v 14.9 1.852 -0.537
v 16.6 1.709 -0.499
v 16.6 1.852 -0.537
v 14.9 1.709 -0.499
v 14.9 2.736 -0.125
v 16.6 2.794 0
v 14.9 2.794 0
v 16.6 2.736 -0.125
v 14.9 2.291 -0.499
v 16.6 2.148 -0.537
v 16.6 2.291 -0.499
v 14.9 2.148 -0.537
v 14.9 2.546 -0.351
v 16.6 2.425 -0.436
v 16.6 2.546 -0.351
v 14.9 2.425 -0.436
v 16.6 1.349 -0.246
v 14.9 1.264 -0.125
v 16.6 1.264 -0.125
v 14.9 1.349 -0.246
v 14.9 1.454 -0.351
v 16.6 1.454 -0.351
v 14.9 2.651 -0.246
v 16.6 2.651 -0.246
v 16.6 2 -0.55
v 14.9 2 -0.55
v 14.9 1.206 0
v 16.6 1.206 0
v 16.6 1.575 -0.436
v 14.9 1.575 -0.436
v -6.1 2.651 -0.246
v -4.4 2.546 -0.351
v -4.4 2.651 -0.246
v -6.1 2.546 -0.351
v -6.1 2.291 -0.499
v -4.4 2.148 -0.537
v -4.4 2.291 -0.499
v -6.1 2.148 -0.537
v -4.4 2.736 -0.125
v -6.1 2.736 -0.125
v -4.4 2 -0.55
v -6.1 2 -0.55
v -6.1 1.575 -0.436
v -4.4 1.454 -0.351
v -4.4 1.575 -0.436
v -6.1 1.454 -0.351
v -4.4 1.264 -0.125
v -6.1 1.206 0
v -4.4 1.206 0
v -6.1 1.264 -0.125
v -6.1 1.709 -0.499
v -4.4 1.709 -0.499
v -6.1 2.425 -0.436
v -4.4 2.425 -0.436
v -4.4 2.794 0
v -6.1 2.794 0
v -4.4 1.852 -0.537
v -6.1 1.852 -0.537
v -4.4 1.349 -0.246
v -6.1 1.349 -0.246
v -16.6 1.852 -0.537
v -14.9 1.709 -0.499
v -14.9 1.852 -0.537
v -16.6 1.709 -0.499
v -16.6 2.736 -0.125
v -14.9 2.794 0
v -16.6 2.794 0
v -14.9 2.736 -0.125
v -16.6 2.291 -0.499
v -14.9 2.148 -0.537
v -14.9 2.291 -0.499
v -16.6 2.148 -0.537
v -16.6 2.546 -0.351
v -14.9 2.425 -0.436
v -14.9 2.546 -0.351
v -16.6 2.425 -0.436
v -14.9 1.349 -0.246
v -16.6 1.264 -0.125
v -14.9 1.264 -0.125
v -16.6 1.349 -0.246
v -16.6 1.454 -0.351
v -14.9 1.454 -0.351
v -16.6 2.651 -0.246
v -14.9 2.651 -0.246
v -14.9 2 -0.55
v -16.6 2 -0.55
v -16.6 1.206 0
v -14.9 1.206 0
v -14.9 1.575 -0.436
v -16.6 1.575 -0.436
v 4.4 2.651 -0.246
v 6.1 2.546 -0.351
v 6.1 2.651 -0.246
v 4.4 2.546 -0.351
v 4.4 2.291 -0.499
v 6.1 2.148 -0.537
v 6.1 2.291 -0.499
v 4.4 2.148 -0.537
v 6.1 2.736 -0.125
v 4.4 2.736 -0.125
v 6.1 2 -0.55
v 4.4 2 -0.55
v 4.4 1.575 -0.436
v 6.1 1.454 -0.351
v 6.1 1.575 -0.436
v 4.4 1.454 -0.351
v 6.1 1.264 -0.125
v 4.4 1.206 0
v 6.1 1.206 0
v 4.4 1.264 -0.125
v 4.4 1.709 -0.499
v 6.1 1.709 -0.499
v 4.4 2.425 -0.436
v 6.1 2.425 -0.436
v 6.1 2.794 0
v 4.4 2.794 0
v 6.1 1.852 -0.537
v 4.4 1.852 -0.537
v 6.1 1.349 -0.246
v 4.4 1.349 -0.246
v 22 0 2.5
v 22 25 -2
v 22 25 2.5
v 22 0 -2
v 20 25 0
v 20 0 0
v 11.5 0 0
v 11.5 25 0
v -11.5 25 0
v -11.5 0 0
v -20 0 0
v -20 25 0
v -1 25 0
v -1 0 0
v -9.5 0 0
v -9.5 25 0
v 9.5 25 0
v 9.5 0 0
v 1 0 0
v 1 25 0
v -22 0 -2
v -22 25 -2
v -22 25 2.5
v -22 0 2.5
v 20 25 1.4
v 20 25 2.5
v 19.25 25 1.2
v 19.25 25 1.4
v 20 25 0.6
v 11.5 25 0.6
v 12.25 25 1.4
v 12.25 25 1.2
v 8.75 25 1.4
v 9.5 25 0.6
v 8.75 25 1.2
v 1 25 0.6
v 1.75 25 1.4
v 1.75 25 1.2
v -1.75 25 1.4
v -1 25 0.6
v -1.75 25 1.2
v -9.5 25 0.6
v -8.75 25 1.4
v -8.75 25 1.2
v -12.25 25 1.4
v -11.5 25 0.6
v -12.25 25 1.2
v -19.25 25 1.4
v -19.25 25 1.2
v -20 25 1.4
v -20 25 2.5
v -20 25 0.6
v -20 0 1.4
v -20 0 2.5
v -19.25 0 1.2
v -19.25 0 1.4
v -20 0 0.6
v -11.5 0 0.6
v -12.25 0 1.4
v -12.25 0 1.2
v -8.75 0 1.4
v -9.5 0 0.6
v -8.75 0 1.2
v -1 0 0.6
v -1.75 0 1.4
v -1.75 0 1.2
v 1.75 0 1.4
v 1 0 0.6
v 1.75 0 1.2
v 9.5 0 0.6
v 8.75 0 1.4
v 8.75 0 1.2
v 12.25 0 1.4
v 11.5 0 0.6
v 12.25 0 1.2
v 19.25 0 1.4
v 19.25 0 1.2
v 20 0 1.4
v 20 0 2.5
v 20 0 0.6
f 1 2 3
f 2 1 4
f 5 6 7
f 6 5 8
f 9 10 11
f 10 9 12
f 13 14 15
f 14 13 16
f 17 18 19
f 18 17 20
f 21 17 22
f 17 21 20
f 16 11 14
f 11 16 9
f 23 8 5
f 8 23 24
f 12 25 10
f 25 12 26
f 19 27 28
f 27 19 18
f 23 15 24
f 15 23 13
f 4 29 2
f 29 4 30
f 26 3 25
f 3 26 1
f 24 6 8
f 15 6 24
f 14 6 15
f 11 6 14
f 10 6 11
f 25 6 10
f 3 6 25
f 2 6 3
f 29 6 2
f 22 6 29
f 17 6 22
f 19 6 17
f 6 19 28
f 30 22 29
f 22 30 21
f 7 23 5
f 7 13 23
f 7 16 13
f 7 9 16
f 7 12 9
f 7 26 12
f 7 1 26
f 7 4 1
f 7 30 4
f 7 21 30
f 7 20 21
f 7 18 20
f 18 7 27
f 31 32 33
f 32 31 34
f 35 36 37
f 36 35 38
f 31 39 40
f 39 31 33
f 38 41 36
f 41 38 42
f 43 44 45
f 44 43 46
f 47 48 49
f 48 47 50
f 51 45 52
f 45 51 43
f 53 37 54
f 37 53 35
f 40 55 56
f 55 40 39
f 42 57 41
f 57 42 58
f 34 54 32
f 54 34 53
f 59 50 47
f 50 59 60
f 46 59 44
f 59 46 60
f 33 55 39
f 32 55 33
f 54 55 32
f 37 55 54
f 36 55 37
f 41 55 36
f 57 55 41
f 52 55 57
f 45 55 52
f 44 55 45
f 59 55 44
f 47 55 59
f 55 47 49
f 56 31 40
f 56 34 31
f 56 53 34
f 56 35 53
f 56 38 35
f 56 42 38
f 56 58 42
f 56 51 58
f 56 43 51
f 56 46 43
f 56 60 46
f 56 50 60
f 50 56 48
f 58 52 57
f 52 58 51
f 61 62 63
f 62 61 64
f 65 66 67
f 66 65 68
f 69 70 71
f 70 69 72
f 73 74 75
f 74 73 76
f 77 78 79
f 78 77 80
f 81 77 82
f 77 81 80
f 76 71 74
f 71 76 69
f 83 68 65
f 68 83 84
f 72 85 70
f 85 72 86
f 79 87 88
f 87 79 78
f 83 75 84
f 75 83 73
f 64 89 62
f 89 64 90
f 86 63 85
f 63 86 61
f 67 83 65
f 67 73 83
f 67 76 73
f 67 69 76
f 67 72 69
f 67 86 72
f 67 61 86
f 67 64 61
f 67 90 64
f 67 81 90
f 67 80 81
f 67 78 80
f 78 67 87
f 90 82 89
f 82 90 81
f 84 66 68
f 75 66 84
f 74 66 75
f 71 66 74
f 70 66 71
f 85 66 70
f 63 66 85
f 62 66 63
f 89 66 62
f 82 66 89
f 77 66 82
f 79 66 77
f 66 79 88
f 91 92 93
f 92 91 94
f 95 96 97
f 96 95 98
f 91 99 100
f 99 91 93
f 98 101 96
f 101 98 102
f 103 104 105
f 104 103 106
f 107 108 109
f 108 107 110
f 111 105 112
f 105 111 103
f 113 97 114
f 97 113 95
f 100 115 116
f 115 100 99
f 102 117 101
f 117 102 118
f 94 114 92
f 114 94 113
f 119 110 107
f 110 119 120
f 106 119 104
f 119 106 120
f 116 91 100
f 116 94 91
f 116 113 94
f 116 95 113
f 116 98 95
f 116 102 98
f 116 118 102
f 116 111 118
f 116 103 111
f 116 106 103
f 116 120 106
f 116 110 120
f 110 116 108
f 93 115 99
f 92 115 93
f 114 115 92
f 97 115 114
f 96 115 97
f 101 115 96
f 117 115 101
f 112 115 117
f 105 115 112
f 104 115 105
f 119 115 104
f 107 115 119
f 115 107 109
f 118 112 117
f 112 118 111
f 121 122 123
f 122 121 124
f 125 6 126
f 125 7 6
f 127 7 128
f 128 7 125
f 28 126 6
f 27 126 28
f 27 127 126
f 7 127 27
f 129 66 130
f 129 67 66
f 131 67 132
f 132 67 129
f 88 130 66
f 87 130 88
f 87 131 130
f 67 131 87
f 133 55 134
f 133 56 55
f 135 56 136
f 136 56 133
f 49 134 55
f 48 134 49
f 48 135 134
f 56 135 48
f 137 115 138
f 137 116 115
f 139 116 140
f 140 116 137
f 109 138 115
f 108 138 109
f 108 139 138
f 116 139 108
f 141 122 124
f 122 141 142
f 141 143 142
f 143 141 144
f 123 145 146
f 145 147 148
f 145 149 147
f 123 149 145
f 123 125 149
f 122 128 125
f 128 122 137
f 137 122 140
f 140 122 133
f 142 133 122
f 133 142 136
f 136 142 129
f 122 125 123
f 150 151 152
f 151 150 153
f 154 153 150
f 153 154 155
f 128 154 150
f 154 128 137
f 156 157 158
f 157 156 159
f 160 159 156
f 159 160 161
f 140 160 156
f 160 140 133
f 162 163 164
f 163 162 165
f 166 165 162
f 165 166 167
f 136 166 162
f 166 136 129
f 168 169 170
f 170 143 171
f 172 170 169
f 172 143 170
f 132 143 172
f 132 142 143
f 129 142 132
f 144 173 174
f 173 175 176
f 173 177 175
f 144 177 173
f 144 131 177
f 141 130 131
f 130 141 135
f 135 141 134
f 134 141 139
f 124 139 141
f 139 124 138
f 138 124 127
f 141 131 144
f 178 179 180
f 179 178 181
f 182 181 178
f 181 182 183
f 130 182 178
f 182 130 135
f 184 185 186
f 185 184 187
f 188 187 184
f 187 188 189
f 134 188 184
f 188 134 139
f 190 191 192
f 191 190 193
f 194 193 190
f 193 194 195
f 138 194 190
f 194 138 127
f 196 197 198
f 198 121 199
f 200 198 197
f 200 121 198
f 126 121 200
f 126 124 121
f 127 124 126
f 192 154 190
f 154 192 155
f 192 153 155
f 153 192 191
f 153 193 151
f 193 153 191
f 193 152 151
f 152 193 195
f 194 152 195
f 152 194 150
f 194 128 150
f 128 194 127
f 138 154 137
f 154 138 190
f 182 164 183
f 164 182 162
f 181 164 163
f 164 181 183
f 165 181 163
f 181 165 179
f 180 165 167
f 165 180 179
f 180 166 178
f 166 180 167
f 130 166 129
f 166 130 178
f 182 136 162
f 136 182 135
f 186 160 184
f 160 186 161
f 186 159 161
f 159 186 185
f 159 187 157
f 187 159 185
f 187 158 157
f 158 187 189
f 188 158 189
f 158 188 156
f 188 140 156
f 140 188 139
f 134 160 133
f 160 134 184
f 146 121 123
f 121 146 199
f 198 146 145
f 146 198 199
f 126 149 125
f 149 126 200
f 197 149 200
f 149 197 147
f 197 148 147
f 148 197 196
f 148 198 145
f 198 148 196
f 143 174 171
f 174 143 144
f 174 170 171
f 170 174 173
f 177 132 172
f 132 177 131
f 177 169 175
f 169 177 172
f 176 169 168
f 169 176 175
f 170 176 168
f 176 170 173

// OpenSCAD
// file: dovetail.scad
use <utility.scad>

Ddovetail = [
    [ "male",
        [
            [ "head_height", 0.8 ],
            [ "body_width" , 2   ],
            [ "body_height", 0.6 ],
        ]
    ],
    [ "female",
        [
            [ "head_height", 1   ],
            [ "body_width" , 2.4 ],
            [ "body_height", 0.5 ],
        ]
    ],
];

module dovetail(length, male = false, half = false) {
    // Makes the dovetail that connects the mount to the lamp itself
    // This module makes both the male and female dovetail since the only thing that really varies between them is the dimensions
    // The whole part is just a 2d polygon that's linearly extruded to the given length
    D = get(Ddovetail, male ? "male" : "female");
    // Calculated variables
    head_width = get(D, "body_width") + 2 * (get(D, "head_height") + (male ? -0.05 : 0.15));
    height = get(D, "head_height") + get(D, "body_height");

    // This vector is actually only contains the half of the points on the positive side of the X-axis, it is effectively mirrored about the axis a little later
    path = [
        [get(D, "body_width") / 2, 0],
        [get(D, "body_width") / 2, get(D, "body_height")],
        male ? [head_width / 2, height - 0.2] : [head_width / 2, height], // I can't tell it to skip for the female, so I'm just placing a point on top of the next one
        [head_width / 2, height],
        [0, height],
    ];

    rotate([-90, 180, 0])
    linear_extrude(length)
    if (half) { polygon(concat(path, [[0, 0]])); }
    else { polygon(concat(path, reverse(flip_sign_x(path)))); }
    // I reverse the sign of the x coordinates of all the points in the `path` vector and put them in the right order with the reverse function to do the mirroring. Like the native mirror function it doesnt create a copy, so I need to concat the mirrored point vector with the original.
}
// file: utility.scad
// Hashmap function
function get(hashmap, key) = [ for (i = hashmap) if (i[0] == key) i[1] ][0];
// Utility functions
function reverse(list) = [for (i = [len(list)-1:-1:0]) list[i]]; // From scad-utils
function flip_sign_x(list) = [ for (i = list) [ i[0] * -1, i[1] ] ];
module mirror_x() {
    for (i = [0, 1]) { mirror([i, 0, 0]) {
        children();
    }}
}
// file: mount.scad
use <utility.scad>
include <dovetail.scad>

// These variables have to be in another file
// Sheet
sheet_width = 30;
// Lamp
lamp_width = sheet_width + 14; // TODO: I still need to specify exactly where those 14mm come from

general = [
    [ "length", 25 ],
    [ "locking_nubs_position", 2 ],
];

male = [
    [ "wall_thickness", 2 ],
    [ "base_height", 2 ],
];

female = [
    [ "width", lamp_width + (-get(male, "wall_thickness") - 0.2) * 2],
    [ "height", 1 + get(get(Ddovetail, "female"), "head_height") + get(get(Ddovetail, "female"), "body_height")],
    [ "back_stop_thickness", 1 ],
];

Dmount = [
    [ "general", general],
    [ "male", male],
    [ "female", female],
];

module mount_male() {
    // Creates a single mounting piece which is part of the lamp, slides into the single_mount
    // Consists of a base cube with holes for the locking nubs cut into it. Then the dovetails are added. And the walls, which are just cubes with a half dovetail sticking out of their sides
    D = get(Dmount, "male");
    Dgen = get(Dmount, "general");

    difference() {
        // Base cube
        translate([-lamp_width / 2, 0, -get(D, "base_height")]) cube([lamp_width, get(Dgen, "length"), get(D, "base_height")]);
        // Locking nub holes
        nub_distribution() {
            dimension = 1.7;
            translate([-dimension / 2, get(Dgen, "locking_nubs_position"), 0.3]) 
            rotate([90, 0, 90]) 
            cylinder(h = dimension, d = dimension);
        }
    }

    // Dovetails
    dovetails_distribution() {
        dovetail(get(Dgen, "length"), true);
    }
    // Walls
    mirror_x() {
        translate([lamp_width / 2 - get(D, "wall_thickness"), 0, 0]) {
            cube([get(D, "wall_thickness"), get(Dgen, "length"), get(get(Dmount, "female"), "height")]);
            translate([get(get(Ddovetail, "male"), "body_width") / 2, 0, 0]) dovetail(get(Dgen, "length"), true, true);
        }
    }
}

module mount_female() {
    // Creates a single mounting piece that can be taped to the surface where the lamp should be mounted. A lamp would typically use multiple of these
    // It starts with a base cube that gets 3 dovetails and some side slits cut into it, after that the additive features go on, that's a back stop and the locking nubs
    D = get(Dmount, "female");
    Dgen = get(Dmount, "general");

    difference() {
        // Base cube
        translate([-get(D, "width") / 2, 0, 0]) cube([get(D, "width"), get(Dgen, "length"), get(D, "height")]);
        // Dovetails
        dovetails_distribution() {
            dovetail(get(Dgen, "length"));
        }
        // Side slits
        mirror_x() {
            translate([(get(D, "width") + get(get(Ddovetail, "female"), "body_width")) / 2, 0, 0]) 
            dovetail(get(Dgen, "length"));
        }
    }
    // Back stop
    translate([-get(D, "width") / 2, -get(D, "back_stop_thickness"), 0]) cube([get(D, "width"), get(D, "back_stop_thickness"), get(D, "height")]);
    // Nubs
    nub_distribution() {
        translate([0, get(Dgen, "locking_nubs_position"), 0.4]) sphere(d = 1.5);
    }
}

module dovetails_distribution(ratio = 1, middle_child = true) {
    // Makes 3 copies of the object passed to it in the pattern that the dovetails need to be in in the mount and consequently, on the lamp
    if (middle_child) children();
    mirror_x() {
        translate([(lamp_width / 2 - 1) / 2 * ratio, 0, 0]) // I don't know where -1 comes from
        children();
    }
}

module nub_distribution() {
    dovetails_distribution(0.5, false) { // Here I set the ratio to 1/2 to get the nubs to be centered between the dovetails
        dovetails_distribution(1, false) { // We need 2 sets of nubs
            children();
        }
    }
}
// main file
$fa = 1;
$fs = $preview ? 1 : 0.15;

use <mount.scad>

// Which part to make
PART = "lamp"; // [ mount, lamp ]
// TODO: Make this customizer affect the actual parts, not the mount

mount_male();
